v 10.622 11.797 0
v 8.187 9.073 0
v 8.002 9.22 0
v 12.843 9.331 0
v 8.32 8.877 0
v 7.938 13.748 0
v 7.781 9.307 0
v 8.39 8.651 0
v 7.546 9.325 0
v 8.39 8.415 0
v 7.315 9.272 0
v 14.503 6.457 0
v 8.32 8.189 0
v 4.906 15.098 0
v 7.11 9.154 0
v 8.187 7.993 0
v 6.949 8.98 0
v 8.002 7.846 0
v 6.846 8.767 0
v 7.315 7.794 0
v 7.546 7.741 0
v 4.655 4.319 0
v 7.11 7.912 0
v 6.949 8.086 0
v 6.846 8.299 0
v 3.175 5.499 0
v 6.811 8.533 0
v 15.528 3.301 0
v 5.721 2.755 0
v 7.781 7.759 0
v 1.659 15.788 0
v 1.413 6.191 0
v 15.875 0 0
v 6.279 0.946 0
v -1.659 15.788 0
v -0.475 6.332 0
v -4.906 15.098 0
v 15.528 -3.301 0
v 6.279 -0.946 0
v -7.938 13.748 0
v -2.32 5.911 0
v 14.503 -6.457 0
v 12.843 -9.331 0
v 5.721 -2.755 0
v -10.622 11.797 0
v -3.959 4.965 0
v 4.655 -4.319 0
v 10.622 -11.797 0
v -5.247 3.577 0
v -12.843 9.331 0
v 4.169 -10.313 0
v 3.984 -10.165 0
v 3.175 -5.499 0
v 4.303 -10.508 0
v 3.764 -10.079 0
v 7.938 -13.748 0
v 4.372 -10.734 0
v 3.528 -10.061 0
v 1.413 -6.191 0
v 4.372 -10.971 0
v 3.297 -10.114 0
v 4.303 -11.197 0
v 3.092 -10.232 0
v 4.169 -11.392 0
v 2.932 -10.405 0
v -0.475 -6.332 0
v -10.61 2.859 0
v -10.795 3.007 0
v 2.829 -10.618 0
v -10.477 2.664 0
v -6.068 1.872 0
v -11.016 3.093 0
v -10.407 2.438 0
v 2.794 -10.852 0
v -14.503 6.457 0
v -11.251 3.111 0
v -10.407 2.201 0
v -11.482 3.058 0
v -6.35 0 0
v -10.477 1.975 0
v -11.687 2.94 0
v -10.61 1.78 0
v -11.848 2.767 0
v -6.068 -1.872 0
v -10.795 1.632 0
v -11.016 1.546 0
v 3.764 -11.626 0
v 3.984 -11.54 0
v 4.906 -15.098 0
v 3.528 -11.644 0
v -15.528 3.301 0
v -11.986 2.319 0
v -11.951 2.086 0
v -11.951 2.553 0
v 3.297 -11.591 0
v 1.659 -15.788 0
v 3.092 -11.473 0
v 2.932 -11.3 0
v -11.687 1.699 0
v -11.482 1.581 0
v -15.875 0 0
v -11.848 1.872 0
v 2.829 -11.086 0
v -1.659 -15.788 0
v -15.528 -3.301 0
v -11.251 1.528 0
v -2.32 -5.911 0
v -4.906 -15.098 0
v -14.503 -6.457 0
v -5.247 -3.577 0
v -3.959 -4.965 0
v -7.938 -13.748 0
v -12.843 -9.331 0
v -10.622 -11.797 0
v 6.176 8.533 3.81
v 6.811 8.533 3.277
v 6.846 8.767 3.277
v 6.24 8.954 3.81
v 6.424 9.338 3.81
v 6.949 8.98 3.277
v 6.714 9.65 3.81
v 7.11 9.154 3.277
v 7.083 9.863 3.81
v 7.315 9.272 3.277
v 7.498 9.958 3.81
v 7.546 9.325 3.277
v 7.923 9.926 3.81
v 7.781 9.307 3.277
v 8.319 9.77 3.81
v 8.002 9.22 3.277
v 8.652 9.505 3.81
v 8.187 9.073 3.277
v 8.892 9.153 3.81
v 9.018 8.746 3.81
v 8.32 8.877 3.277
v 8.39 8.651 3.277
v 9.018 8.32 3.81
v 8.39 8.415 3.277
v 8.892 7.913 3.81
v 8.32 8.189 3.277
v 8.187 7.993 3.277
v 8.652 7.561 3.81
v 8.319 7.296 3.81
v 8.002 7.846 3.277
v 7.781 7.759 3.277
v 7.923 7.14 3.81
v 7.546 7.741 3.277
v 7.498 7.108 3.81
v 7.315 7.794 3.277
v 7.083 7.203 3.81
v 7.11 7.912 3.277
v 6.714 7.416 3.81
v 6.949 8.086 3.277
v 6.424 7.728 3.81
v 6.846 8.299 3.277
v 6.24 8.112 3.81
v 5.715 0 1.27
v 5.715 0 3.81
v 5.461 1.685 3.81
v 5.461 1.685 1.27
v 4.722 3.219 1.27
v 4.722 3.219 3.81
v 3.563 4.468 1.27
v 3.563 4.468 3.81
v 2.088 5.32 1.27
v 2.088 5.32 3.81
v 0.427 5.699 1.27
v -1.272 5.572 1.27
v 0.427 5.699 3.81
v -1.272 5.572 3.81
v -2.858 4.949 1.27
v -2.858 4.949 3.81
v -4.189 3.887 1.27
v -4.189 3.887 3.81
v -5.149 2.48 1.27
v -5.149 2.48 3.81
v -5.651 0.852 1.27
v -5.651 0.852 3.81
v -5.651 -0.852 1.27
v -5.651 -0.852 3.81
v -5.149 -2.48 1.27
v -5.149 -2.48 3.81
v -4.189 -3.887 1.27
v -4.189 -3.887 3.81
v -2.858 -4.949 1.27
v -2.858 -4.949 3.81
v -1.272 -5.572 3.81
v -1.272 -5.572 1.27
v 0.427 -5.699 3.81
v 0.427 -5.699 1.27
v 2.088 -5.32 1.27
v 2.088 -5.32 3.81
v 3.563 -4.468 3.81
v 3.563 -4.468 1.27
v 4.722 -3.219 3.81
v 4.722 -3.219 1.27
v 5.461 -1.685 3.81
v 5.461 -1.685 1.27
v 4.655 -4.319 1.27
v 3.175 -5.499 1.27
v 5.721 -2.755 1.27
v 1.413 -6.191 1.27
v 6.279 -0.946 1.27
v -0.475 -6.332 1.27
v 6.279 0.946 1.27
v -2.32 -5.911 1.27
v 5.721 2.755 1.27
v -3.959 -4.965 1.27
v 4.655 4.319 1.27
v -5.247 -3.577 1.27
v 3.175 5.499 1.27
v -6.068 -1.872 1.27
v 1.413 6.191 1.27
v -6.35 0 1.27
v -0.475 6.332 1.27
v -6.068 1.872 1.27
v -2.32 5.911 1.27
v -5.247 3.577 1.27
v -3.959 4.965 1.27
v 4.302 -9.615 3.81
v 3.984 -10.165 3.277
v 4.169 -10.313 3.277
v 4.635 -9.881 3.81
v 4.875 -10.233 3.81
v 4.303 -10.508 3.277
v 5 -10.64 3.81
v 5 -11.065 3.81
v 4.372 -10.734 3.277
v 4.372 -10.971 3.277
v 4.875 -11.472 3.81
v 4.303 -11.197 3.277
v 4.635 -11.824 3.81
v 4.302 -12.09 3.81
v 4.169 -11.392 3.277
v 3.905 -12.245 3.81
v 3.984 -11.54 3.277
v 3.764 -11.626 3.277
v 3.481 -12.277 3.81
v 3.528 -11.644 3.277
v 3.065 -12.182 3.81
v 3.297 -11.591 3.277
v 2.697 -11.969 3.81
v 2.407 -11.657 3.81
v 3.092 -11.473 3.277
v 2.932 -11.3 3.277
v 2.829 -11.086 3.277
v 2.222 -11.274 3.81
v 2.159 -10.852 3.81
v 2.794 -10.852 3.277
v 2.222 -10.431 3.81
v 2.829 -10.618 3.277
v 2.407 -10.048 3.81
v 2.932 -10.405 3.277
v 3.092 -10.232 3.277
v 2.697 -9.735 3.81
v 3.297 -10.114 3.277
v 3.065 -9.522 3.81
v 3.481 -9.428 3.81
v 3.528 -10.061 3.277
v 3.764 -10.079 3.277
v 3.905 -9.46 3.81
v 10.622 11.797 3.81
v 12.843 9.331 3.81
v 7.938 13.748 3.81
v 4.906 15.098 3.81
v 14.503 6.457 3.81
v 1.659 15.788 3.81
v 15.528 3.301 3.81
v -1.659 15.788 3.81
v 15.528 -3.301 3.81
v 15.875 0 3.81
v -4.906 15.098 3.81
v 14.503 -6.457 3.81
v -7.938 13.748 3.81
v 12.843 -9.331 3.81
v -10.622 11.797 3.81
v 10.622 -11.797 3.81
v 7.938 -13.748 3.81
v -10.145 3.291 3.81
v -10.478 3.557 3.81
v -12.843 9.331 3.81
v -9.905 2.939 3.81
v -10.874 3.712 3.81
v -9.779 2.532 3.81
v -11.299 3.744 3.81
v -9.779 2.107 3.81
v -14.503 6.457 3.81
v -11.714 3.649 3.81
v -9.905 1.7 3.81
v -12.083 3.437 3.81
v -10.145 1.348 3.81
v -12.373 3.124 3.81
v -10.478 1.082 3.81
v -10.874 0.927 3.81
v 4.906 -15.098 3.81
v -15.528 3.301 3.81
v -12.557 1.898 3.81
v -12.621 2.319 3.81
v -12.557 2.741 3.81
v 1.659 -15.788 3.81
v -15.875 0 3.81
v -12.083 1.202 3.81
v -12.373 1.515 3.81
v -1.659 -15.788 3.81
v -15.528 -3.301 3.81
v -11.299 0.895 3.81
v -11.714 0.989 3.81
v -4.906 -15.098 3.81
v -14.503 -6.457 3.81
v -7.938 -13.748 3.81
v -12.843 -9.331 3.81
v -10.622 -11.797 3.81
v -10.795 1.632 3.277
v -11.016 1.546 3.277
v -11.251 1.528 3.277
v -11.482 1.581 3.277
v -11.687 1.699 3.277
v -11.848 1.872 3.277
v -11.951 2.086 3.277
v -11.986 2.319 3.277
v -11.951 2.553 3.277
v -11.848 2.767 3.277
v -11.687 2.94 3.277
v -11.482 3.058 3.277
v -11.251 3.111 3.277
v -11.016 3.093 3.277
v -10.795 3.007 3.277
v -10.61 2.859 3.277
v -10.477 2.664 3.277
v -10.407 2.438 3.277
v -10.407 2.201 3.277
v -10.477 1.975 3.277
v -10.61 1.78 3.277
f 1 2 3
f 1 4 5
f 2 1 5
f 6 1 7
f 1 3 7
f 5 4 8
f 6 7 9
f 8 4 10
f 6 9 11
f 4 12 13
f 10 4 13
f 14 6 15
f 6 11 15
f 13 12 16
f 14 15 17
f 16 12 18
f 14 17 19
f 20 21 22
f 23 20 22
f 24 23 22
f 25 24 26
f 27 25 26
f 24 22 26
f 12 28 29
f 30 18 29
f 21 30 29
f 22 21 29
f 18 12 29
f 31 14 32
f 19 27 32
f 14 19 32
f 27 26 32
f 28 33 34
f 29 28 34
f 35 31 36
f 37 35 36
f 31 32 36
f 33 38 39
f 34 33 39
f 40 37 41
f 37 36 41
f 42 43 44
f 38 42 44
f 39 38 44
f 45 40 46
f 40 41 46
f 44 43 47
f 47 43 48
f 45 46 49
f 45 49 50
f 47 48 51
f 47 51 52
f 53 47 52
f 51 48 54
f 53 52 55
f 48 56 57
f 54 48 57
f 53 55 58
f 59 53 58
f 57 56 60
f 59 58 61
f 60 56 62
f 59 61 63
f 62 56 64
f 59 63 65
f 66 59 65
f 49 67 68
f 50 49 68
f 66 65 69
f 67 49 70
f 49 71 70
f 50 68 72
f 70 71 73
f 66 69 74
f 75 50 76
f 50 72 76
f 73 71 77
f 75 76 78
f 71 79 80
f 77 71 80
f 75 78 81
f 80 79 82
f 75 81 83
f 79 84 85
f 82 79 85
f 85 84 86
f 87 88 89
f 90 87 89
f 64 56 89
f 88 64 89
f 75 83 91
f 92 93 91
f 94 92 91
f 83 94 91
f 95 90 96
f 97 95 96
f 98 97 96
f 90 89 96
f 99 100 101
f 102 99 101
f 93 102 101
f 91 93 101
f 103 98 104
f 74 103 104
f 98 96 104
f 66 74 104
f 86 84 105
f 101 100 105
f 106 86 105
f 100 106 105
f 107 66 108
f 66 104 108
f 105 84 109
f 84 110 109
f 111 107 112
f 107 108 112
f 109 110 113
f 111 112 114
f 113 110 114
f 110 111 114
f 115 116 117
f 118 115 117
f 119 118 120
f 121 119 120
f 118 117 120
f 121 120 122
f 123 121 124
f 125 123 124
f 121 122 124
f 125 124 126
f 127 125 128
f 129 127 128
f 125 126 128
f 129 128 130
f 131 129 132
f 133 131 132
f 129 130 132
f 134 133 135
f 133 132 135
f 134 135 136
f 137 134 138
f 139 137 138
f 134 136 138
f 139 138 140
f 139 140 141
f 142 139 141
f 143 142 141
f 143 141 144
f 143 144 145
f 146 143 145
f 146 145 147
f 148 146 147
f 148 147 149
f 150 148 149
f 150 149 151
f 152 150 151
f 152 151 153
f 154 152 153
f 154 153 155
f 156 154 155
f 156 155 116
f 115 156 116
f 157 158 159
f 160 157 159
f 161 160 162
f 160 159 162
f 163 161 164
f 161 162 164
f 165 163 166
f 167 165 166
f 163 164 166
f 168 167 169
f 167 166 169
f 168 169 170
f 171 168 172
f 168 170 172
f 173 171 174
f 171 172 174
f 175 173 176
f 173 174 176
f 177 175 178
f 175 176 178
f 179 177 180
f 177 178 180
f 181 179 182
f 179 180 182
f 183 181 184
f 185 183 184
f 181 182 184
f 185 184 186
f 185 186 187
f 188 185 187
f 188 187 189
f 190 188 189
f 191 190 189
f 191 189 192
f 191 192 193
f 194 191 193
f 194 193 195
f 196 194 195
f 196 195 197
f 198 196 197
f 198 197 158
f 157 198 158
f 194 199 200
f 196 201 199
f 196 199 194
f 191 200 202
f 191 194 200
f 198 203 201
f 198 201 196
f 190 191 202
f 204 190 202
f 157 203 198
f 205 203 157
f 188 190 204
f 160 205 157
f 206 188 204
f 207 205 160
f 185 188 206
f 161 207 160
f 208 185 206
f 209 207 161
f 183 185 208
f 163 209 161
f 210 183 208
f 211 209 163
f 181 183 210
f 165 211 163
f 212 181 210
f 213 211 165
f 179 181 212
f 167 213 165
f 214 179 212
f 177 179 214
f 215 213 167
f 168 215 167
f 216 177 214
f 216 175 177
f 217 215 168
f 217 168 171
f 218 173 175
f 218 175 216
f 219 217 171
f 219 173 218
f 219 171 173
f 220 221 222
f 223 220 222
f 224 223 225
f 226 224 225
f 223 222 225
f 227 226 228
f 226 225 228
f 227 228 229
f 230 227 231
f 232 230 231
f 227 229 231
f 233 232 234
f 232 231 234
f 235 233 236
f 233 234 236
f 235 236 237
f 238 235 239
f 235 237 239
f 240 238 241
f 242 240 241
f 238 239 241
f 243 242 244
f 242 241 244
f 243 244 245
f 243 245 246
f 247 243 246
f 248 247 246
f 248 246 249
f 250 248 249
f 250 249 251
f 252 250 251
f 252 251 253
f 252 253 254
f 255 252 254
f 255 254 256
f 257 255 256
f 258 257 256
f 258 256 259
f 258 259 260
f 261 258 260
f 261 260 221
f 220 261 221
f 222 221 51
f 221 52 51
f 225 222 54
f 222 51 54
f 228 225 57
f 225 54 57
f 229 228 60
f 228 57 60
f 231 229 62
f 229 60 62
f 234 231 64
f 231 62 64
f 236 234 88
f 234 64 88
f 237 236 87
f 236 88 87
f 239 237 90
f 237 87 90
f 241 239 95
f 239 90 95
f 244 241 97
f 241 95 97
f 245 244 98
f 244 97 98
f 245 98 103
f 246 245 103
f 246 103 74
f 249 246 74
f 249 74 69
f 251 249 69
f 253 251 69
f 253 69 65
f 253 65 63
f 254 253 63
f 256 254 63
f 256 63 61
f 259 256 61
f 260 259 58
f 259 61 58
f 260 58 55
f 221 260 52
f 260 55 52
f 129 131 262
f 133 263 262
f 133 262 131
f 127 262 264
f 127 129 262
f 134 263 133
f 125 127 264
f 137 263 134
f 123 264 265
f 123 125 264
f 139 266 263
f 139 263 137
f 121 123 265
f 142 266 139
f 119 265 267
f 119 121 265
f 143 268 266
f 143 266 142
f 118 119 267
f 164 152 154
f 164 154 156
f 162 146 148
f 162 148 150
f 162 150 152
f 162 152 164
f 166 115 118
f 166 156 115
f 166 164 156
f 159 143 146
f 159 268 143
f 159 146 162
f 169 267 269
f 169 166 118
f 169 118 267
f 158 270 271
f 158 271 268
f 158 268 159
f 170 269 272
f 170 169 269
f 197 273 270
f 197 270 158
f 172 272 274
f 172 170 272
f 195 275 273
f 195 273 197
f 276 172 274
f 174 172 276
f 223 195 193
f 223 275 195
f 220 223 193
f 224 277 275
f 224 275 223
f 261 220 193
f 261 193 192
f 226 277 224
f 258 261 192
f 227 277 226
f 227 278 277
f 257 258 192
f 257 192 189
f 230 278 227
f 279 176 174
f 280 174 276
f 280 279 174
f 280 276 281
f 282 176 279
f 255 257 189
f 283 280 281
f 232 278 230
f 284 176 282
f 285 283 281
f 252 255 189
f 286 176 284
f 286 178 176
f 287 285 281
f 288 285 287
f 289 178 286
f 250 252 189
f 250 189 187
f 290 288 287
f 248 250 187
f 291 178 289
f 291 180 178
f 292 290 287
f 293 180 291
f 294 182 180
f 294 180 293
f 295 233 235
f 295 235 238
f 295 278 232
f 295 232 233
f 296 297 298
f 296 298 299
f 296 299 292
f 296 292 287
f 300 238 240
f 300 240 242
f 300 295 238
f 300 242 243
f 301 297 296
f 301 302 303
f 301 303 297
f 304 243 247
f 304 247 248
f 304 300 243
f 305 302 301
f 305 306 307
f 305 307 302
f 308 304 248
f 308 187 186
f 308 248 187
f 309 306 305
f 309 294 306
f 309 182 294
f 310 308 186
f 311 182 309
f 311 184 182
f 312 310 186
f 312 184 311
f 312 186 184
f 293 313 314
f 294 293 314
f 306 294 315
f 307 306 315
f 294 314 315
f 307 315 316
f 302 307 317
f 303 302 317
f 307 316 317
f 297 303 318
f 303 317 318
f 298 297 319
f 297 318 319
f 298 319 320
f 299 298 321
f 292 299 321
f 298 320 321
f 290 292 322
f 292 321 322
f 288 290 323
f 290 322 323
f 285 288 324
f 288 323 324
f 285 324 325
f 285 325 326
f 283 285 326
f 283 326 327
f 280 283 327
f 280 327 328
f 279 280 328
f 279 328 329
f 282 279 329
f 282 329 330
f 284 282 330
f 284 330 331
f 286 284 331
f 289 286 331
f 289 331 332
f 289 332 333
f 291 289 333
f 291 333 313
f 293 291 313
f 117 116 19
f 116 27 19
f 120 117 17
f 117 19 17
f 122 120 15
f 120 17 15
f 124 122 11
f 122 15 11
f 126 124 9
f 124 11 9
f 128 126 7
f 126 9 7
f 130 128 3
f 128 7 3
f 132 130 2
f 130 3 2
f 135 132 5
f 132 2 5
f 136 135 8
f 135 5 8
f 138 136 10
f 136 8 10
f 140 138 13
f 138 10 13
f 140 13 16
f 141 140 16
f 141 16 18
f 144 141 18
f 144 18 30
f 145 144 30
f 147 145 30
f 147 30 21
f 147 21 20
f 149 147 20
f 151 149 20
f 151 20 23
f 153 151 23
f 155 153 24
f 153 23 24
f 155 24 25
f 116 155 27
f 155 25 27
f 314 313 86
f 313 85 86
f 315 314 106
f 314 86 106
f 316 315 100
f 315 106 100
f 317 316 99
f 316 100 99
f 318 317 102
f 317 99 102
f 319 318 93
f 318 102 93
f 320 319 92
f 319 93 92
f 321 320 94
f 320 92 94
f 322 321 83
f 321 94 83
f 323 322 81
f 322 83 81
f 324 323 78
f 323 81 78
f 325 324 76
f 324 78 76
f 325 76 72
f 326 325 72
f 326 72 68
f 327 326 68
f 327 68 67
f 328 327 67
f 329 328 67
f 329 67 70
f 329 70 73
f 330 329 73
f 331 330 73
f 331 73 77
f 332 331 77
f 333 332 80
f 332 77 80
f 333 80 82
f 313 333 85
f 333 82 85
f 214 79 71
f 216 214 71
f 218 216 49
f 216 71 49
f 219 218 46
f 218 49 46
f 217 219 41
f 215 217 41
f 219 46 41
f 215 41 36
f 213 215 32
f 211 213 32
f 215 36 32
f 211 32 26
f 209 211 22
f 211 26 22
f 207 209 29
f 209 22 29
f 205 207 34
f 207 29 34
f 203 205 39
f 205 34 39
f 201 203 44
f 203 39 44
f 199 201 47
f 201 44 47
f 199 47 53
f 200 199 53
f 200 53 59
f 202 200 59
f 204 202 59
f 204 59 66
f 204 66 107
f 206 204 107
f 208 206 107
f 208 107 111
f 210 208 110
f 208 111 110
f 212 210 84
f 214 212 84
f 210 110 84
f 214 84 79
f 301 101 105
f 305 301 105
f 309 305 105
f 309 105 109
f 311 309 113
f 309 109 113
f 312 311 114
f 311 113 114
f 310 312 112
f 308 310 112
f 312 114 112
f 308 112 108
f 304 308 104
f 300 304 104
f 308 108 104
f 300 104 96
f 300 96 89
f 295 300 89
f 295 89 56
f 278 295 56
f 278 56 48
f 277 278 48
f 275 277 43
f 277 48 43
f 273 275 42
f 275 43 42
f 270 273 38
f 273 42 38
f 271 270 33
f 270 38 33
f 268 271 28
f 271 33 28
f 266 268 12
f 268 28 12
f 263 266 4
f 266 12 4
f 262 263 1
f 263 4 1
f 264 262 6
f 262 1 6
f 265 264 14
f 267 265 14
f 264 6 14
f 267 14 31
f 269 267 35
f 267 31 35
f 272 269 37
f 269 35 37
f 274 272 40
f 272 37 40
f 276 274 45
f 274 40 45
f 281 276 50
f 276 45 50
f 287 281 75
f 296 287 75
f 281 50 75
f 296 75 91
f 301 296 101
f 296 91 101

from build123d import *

# Parameters (mm, degrees)
SKETCH1_R                                = 15.875
BOSS_EXTRUDE1_DEPTH                      = 3.81
SKETCH2_R                                = 5.715
CUT_EXTRUDE1_DEPTH                       = 23.771634768
SKETCH3_R                                = 6.35
CUT_EXTRUDE3_DEPTH                       = 1.27
F_1_16_0_0625_DIAMETER_HOLE1_D           = 1.5875
F_1_16_0_0625_DIAMETER_HOLE1_CSINK_D     = 2.8575
F_1_16_0_0625_DIAMETER_HOLE1_CSINK_ANGLE = 100
CIRPATTERN1_COUNT                        = 3


with BuildPart() as part:
    # Sketch1 → Boss-Extrude1 (new body)
    with BuildSketch(Plane.XY):
        with Locations(Location((0, 0, 0), (0, 0, 180))):
            Circle(SKETCH1_R)
    extrude(amount=BOSS_EXTRUDE1_DEPTH)

    # Sketch2 → Cut-Extrude1 (cut, through all)
    with BuildSketch(Plane.XY.offset(3.81)):
        Circle(SKETCH2_R)
    extrude(amount=-CUT_EXTRUDE1_DEPTH, mode=Mode.SUBTRACT)

    # Sketch3 → Cut-Extrude3 (cut)
    with BuildSketch(Plane(origin=(0, 0, 0), x_dir=(-1, 0, 0), z_dir=(0, 0, -1))):
        Circle(SKETCH3_R)
    extrude(amount=-CUT_EXTRUDE3_DEPTH, mode=Mode.SUBTRACT)

    # 1/16 (0.0625) Diameter Hole1 (through all)
    with Locations(Plane.XY.offset(3.81)):
        with Locations((7.60482237, 8.532969982)):
            f_1_16_0_0625_diameter_hole1 = CounterSinkHole(F_1_16_0_0625_DIAMETER_HOLE1_D / 2, F_1_16_0_0625_DIAMETER_HOLE1_CSINK_D / 2, counter_sink_angle=F_1_16_0_0625_DIAMETER_HOLE1_CSINK_ANGLE)

    # CirPattern1: 1/16 (0.0625) Diameter Hole1 ×3 about axis
    cirpattern1_axis = Axis((0, 0, 0), (0, 0, 1))
    for i in range(1, CIRPATTERN1_COUNT):
        add(f_1_16_0_0625_diameter_hole1.rotate(cirpattern1_axis, i * 360 / CIRPATTERN1_COUNT), mode=Mode.SUBTRACT)


solid = part.part
